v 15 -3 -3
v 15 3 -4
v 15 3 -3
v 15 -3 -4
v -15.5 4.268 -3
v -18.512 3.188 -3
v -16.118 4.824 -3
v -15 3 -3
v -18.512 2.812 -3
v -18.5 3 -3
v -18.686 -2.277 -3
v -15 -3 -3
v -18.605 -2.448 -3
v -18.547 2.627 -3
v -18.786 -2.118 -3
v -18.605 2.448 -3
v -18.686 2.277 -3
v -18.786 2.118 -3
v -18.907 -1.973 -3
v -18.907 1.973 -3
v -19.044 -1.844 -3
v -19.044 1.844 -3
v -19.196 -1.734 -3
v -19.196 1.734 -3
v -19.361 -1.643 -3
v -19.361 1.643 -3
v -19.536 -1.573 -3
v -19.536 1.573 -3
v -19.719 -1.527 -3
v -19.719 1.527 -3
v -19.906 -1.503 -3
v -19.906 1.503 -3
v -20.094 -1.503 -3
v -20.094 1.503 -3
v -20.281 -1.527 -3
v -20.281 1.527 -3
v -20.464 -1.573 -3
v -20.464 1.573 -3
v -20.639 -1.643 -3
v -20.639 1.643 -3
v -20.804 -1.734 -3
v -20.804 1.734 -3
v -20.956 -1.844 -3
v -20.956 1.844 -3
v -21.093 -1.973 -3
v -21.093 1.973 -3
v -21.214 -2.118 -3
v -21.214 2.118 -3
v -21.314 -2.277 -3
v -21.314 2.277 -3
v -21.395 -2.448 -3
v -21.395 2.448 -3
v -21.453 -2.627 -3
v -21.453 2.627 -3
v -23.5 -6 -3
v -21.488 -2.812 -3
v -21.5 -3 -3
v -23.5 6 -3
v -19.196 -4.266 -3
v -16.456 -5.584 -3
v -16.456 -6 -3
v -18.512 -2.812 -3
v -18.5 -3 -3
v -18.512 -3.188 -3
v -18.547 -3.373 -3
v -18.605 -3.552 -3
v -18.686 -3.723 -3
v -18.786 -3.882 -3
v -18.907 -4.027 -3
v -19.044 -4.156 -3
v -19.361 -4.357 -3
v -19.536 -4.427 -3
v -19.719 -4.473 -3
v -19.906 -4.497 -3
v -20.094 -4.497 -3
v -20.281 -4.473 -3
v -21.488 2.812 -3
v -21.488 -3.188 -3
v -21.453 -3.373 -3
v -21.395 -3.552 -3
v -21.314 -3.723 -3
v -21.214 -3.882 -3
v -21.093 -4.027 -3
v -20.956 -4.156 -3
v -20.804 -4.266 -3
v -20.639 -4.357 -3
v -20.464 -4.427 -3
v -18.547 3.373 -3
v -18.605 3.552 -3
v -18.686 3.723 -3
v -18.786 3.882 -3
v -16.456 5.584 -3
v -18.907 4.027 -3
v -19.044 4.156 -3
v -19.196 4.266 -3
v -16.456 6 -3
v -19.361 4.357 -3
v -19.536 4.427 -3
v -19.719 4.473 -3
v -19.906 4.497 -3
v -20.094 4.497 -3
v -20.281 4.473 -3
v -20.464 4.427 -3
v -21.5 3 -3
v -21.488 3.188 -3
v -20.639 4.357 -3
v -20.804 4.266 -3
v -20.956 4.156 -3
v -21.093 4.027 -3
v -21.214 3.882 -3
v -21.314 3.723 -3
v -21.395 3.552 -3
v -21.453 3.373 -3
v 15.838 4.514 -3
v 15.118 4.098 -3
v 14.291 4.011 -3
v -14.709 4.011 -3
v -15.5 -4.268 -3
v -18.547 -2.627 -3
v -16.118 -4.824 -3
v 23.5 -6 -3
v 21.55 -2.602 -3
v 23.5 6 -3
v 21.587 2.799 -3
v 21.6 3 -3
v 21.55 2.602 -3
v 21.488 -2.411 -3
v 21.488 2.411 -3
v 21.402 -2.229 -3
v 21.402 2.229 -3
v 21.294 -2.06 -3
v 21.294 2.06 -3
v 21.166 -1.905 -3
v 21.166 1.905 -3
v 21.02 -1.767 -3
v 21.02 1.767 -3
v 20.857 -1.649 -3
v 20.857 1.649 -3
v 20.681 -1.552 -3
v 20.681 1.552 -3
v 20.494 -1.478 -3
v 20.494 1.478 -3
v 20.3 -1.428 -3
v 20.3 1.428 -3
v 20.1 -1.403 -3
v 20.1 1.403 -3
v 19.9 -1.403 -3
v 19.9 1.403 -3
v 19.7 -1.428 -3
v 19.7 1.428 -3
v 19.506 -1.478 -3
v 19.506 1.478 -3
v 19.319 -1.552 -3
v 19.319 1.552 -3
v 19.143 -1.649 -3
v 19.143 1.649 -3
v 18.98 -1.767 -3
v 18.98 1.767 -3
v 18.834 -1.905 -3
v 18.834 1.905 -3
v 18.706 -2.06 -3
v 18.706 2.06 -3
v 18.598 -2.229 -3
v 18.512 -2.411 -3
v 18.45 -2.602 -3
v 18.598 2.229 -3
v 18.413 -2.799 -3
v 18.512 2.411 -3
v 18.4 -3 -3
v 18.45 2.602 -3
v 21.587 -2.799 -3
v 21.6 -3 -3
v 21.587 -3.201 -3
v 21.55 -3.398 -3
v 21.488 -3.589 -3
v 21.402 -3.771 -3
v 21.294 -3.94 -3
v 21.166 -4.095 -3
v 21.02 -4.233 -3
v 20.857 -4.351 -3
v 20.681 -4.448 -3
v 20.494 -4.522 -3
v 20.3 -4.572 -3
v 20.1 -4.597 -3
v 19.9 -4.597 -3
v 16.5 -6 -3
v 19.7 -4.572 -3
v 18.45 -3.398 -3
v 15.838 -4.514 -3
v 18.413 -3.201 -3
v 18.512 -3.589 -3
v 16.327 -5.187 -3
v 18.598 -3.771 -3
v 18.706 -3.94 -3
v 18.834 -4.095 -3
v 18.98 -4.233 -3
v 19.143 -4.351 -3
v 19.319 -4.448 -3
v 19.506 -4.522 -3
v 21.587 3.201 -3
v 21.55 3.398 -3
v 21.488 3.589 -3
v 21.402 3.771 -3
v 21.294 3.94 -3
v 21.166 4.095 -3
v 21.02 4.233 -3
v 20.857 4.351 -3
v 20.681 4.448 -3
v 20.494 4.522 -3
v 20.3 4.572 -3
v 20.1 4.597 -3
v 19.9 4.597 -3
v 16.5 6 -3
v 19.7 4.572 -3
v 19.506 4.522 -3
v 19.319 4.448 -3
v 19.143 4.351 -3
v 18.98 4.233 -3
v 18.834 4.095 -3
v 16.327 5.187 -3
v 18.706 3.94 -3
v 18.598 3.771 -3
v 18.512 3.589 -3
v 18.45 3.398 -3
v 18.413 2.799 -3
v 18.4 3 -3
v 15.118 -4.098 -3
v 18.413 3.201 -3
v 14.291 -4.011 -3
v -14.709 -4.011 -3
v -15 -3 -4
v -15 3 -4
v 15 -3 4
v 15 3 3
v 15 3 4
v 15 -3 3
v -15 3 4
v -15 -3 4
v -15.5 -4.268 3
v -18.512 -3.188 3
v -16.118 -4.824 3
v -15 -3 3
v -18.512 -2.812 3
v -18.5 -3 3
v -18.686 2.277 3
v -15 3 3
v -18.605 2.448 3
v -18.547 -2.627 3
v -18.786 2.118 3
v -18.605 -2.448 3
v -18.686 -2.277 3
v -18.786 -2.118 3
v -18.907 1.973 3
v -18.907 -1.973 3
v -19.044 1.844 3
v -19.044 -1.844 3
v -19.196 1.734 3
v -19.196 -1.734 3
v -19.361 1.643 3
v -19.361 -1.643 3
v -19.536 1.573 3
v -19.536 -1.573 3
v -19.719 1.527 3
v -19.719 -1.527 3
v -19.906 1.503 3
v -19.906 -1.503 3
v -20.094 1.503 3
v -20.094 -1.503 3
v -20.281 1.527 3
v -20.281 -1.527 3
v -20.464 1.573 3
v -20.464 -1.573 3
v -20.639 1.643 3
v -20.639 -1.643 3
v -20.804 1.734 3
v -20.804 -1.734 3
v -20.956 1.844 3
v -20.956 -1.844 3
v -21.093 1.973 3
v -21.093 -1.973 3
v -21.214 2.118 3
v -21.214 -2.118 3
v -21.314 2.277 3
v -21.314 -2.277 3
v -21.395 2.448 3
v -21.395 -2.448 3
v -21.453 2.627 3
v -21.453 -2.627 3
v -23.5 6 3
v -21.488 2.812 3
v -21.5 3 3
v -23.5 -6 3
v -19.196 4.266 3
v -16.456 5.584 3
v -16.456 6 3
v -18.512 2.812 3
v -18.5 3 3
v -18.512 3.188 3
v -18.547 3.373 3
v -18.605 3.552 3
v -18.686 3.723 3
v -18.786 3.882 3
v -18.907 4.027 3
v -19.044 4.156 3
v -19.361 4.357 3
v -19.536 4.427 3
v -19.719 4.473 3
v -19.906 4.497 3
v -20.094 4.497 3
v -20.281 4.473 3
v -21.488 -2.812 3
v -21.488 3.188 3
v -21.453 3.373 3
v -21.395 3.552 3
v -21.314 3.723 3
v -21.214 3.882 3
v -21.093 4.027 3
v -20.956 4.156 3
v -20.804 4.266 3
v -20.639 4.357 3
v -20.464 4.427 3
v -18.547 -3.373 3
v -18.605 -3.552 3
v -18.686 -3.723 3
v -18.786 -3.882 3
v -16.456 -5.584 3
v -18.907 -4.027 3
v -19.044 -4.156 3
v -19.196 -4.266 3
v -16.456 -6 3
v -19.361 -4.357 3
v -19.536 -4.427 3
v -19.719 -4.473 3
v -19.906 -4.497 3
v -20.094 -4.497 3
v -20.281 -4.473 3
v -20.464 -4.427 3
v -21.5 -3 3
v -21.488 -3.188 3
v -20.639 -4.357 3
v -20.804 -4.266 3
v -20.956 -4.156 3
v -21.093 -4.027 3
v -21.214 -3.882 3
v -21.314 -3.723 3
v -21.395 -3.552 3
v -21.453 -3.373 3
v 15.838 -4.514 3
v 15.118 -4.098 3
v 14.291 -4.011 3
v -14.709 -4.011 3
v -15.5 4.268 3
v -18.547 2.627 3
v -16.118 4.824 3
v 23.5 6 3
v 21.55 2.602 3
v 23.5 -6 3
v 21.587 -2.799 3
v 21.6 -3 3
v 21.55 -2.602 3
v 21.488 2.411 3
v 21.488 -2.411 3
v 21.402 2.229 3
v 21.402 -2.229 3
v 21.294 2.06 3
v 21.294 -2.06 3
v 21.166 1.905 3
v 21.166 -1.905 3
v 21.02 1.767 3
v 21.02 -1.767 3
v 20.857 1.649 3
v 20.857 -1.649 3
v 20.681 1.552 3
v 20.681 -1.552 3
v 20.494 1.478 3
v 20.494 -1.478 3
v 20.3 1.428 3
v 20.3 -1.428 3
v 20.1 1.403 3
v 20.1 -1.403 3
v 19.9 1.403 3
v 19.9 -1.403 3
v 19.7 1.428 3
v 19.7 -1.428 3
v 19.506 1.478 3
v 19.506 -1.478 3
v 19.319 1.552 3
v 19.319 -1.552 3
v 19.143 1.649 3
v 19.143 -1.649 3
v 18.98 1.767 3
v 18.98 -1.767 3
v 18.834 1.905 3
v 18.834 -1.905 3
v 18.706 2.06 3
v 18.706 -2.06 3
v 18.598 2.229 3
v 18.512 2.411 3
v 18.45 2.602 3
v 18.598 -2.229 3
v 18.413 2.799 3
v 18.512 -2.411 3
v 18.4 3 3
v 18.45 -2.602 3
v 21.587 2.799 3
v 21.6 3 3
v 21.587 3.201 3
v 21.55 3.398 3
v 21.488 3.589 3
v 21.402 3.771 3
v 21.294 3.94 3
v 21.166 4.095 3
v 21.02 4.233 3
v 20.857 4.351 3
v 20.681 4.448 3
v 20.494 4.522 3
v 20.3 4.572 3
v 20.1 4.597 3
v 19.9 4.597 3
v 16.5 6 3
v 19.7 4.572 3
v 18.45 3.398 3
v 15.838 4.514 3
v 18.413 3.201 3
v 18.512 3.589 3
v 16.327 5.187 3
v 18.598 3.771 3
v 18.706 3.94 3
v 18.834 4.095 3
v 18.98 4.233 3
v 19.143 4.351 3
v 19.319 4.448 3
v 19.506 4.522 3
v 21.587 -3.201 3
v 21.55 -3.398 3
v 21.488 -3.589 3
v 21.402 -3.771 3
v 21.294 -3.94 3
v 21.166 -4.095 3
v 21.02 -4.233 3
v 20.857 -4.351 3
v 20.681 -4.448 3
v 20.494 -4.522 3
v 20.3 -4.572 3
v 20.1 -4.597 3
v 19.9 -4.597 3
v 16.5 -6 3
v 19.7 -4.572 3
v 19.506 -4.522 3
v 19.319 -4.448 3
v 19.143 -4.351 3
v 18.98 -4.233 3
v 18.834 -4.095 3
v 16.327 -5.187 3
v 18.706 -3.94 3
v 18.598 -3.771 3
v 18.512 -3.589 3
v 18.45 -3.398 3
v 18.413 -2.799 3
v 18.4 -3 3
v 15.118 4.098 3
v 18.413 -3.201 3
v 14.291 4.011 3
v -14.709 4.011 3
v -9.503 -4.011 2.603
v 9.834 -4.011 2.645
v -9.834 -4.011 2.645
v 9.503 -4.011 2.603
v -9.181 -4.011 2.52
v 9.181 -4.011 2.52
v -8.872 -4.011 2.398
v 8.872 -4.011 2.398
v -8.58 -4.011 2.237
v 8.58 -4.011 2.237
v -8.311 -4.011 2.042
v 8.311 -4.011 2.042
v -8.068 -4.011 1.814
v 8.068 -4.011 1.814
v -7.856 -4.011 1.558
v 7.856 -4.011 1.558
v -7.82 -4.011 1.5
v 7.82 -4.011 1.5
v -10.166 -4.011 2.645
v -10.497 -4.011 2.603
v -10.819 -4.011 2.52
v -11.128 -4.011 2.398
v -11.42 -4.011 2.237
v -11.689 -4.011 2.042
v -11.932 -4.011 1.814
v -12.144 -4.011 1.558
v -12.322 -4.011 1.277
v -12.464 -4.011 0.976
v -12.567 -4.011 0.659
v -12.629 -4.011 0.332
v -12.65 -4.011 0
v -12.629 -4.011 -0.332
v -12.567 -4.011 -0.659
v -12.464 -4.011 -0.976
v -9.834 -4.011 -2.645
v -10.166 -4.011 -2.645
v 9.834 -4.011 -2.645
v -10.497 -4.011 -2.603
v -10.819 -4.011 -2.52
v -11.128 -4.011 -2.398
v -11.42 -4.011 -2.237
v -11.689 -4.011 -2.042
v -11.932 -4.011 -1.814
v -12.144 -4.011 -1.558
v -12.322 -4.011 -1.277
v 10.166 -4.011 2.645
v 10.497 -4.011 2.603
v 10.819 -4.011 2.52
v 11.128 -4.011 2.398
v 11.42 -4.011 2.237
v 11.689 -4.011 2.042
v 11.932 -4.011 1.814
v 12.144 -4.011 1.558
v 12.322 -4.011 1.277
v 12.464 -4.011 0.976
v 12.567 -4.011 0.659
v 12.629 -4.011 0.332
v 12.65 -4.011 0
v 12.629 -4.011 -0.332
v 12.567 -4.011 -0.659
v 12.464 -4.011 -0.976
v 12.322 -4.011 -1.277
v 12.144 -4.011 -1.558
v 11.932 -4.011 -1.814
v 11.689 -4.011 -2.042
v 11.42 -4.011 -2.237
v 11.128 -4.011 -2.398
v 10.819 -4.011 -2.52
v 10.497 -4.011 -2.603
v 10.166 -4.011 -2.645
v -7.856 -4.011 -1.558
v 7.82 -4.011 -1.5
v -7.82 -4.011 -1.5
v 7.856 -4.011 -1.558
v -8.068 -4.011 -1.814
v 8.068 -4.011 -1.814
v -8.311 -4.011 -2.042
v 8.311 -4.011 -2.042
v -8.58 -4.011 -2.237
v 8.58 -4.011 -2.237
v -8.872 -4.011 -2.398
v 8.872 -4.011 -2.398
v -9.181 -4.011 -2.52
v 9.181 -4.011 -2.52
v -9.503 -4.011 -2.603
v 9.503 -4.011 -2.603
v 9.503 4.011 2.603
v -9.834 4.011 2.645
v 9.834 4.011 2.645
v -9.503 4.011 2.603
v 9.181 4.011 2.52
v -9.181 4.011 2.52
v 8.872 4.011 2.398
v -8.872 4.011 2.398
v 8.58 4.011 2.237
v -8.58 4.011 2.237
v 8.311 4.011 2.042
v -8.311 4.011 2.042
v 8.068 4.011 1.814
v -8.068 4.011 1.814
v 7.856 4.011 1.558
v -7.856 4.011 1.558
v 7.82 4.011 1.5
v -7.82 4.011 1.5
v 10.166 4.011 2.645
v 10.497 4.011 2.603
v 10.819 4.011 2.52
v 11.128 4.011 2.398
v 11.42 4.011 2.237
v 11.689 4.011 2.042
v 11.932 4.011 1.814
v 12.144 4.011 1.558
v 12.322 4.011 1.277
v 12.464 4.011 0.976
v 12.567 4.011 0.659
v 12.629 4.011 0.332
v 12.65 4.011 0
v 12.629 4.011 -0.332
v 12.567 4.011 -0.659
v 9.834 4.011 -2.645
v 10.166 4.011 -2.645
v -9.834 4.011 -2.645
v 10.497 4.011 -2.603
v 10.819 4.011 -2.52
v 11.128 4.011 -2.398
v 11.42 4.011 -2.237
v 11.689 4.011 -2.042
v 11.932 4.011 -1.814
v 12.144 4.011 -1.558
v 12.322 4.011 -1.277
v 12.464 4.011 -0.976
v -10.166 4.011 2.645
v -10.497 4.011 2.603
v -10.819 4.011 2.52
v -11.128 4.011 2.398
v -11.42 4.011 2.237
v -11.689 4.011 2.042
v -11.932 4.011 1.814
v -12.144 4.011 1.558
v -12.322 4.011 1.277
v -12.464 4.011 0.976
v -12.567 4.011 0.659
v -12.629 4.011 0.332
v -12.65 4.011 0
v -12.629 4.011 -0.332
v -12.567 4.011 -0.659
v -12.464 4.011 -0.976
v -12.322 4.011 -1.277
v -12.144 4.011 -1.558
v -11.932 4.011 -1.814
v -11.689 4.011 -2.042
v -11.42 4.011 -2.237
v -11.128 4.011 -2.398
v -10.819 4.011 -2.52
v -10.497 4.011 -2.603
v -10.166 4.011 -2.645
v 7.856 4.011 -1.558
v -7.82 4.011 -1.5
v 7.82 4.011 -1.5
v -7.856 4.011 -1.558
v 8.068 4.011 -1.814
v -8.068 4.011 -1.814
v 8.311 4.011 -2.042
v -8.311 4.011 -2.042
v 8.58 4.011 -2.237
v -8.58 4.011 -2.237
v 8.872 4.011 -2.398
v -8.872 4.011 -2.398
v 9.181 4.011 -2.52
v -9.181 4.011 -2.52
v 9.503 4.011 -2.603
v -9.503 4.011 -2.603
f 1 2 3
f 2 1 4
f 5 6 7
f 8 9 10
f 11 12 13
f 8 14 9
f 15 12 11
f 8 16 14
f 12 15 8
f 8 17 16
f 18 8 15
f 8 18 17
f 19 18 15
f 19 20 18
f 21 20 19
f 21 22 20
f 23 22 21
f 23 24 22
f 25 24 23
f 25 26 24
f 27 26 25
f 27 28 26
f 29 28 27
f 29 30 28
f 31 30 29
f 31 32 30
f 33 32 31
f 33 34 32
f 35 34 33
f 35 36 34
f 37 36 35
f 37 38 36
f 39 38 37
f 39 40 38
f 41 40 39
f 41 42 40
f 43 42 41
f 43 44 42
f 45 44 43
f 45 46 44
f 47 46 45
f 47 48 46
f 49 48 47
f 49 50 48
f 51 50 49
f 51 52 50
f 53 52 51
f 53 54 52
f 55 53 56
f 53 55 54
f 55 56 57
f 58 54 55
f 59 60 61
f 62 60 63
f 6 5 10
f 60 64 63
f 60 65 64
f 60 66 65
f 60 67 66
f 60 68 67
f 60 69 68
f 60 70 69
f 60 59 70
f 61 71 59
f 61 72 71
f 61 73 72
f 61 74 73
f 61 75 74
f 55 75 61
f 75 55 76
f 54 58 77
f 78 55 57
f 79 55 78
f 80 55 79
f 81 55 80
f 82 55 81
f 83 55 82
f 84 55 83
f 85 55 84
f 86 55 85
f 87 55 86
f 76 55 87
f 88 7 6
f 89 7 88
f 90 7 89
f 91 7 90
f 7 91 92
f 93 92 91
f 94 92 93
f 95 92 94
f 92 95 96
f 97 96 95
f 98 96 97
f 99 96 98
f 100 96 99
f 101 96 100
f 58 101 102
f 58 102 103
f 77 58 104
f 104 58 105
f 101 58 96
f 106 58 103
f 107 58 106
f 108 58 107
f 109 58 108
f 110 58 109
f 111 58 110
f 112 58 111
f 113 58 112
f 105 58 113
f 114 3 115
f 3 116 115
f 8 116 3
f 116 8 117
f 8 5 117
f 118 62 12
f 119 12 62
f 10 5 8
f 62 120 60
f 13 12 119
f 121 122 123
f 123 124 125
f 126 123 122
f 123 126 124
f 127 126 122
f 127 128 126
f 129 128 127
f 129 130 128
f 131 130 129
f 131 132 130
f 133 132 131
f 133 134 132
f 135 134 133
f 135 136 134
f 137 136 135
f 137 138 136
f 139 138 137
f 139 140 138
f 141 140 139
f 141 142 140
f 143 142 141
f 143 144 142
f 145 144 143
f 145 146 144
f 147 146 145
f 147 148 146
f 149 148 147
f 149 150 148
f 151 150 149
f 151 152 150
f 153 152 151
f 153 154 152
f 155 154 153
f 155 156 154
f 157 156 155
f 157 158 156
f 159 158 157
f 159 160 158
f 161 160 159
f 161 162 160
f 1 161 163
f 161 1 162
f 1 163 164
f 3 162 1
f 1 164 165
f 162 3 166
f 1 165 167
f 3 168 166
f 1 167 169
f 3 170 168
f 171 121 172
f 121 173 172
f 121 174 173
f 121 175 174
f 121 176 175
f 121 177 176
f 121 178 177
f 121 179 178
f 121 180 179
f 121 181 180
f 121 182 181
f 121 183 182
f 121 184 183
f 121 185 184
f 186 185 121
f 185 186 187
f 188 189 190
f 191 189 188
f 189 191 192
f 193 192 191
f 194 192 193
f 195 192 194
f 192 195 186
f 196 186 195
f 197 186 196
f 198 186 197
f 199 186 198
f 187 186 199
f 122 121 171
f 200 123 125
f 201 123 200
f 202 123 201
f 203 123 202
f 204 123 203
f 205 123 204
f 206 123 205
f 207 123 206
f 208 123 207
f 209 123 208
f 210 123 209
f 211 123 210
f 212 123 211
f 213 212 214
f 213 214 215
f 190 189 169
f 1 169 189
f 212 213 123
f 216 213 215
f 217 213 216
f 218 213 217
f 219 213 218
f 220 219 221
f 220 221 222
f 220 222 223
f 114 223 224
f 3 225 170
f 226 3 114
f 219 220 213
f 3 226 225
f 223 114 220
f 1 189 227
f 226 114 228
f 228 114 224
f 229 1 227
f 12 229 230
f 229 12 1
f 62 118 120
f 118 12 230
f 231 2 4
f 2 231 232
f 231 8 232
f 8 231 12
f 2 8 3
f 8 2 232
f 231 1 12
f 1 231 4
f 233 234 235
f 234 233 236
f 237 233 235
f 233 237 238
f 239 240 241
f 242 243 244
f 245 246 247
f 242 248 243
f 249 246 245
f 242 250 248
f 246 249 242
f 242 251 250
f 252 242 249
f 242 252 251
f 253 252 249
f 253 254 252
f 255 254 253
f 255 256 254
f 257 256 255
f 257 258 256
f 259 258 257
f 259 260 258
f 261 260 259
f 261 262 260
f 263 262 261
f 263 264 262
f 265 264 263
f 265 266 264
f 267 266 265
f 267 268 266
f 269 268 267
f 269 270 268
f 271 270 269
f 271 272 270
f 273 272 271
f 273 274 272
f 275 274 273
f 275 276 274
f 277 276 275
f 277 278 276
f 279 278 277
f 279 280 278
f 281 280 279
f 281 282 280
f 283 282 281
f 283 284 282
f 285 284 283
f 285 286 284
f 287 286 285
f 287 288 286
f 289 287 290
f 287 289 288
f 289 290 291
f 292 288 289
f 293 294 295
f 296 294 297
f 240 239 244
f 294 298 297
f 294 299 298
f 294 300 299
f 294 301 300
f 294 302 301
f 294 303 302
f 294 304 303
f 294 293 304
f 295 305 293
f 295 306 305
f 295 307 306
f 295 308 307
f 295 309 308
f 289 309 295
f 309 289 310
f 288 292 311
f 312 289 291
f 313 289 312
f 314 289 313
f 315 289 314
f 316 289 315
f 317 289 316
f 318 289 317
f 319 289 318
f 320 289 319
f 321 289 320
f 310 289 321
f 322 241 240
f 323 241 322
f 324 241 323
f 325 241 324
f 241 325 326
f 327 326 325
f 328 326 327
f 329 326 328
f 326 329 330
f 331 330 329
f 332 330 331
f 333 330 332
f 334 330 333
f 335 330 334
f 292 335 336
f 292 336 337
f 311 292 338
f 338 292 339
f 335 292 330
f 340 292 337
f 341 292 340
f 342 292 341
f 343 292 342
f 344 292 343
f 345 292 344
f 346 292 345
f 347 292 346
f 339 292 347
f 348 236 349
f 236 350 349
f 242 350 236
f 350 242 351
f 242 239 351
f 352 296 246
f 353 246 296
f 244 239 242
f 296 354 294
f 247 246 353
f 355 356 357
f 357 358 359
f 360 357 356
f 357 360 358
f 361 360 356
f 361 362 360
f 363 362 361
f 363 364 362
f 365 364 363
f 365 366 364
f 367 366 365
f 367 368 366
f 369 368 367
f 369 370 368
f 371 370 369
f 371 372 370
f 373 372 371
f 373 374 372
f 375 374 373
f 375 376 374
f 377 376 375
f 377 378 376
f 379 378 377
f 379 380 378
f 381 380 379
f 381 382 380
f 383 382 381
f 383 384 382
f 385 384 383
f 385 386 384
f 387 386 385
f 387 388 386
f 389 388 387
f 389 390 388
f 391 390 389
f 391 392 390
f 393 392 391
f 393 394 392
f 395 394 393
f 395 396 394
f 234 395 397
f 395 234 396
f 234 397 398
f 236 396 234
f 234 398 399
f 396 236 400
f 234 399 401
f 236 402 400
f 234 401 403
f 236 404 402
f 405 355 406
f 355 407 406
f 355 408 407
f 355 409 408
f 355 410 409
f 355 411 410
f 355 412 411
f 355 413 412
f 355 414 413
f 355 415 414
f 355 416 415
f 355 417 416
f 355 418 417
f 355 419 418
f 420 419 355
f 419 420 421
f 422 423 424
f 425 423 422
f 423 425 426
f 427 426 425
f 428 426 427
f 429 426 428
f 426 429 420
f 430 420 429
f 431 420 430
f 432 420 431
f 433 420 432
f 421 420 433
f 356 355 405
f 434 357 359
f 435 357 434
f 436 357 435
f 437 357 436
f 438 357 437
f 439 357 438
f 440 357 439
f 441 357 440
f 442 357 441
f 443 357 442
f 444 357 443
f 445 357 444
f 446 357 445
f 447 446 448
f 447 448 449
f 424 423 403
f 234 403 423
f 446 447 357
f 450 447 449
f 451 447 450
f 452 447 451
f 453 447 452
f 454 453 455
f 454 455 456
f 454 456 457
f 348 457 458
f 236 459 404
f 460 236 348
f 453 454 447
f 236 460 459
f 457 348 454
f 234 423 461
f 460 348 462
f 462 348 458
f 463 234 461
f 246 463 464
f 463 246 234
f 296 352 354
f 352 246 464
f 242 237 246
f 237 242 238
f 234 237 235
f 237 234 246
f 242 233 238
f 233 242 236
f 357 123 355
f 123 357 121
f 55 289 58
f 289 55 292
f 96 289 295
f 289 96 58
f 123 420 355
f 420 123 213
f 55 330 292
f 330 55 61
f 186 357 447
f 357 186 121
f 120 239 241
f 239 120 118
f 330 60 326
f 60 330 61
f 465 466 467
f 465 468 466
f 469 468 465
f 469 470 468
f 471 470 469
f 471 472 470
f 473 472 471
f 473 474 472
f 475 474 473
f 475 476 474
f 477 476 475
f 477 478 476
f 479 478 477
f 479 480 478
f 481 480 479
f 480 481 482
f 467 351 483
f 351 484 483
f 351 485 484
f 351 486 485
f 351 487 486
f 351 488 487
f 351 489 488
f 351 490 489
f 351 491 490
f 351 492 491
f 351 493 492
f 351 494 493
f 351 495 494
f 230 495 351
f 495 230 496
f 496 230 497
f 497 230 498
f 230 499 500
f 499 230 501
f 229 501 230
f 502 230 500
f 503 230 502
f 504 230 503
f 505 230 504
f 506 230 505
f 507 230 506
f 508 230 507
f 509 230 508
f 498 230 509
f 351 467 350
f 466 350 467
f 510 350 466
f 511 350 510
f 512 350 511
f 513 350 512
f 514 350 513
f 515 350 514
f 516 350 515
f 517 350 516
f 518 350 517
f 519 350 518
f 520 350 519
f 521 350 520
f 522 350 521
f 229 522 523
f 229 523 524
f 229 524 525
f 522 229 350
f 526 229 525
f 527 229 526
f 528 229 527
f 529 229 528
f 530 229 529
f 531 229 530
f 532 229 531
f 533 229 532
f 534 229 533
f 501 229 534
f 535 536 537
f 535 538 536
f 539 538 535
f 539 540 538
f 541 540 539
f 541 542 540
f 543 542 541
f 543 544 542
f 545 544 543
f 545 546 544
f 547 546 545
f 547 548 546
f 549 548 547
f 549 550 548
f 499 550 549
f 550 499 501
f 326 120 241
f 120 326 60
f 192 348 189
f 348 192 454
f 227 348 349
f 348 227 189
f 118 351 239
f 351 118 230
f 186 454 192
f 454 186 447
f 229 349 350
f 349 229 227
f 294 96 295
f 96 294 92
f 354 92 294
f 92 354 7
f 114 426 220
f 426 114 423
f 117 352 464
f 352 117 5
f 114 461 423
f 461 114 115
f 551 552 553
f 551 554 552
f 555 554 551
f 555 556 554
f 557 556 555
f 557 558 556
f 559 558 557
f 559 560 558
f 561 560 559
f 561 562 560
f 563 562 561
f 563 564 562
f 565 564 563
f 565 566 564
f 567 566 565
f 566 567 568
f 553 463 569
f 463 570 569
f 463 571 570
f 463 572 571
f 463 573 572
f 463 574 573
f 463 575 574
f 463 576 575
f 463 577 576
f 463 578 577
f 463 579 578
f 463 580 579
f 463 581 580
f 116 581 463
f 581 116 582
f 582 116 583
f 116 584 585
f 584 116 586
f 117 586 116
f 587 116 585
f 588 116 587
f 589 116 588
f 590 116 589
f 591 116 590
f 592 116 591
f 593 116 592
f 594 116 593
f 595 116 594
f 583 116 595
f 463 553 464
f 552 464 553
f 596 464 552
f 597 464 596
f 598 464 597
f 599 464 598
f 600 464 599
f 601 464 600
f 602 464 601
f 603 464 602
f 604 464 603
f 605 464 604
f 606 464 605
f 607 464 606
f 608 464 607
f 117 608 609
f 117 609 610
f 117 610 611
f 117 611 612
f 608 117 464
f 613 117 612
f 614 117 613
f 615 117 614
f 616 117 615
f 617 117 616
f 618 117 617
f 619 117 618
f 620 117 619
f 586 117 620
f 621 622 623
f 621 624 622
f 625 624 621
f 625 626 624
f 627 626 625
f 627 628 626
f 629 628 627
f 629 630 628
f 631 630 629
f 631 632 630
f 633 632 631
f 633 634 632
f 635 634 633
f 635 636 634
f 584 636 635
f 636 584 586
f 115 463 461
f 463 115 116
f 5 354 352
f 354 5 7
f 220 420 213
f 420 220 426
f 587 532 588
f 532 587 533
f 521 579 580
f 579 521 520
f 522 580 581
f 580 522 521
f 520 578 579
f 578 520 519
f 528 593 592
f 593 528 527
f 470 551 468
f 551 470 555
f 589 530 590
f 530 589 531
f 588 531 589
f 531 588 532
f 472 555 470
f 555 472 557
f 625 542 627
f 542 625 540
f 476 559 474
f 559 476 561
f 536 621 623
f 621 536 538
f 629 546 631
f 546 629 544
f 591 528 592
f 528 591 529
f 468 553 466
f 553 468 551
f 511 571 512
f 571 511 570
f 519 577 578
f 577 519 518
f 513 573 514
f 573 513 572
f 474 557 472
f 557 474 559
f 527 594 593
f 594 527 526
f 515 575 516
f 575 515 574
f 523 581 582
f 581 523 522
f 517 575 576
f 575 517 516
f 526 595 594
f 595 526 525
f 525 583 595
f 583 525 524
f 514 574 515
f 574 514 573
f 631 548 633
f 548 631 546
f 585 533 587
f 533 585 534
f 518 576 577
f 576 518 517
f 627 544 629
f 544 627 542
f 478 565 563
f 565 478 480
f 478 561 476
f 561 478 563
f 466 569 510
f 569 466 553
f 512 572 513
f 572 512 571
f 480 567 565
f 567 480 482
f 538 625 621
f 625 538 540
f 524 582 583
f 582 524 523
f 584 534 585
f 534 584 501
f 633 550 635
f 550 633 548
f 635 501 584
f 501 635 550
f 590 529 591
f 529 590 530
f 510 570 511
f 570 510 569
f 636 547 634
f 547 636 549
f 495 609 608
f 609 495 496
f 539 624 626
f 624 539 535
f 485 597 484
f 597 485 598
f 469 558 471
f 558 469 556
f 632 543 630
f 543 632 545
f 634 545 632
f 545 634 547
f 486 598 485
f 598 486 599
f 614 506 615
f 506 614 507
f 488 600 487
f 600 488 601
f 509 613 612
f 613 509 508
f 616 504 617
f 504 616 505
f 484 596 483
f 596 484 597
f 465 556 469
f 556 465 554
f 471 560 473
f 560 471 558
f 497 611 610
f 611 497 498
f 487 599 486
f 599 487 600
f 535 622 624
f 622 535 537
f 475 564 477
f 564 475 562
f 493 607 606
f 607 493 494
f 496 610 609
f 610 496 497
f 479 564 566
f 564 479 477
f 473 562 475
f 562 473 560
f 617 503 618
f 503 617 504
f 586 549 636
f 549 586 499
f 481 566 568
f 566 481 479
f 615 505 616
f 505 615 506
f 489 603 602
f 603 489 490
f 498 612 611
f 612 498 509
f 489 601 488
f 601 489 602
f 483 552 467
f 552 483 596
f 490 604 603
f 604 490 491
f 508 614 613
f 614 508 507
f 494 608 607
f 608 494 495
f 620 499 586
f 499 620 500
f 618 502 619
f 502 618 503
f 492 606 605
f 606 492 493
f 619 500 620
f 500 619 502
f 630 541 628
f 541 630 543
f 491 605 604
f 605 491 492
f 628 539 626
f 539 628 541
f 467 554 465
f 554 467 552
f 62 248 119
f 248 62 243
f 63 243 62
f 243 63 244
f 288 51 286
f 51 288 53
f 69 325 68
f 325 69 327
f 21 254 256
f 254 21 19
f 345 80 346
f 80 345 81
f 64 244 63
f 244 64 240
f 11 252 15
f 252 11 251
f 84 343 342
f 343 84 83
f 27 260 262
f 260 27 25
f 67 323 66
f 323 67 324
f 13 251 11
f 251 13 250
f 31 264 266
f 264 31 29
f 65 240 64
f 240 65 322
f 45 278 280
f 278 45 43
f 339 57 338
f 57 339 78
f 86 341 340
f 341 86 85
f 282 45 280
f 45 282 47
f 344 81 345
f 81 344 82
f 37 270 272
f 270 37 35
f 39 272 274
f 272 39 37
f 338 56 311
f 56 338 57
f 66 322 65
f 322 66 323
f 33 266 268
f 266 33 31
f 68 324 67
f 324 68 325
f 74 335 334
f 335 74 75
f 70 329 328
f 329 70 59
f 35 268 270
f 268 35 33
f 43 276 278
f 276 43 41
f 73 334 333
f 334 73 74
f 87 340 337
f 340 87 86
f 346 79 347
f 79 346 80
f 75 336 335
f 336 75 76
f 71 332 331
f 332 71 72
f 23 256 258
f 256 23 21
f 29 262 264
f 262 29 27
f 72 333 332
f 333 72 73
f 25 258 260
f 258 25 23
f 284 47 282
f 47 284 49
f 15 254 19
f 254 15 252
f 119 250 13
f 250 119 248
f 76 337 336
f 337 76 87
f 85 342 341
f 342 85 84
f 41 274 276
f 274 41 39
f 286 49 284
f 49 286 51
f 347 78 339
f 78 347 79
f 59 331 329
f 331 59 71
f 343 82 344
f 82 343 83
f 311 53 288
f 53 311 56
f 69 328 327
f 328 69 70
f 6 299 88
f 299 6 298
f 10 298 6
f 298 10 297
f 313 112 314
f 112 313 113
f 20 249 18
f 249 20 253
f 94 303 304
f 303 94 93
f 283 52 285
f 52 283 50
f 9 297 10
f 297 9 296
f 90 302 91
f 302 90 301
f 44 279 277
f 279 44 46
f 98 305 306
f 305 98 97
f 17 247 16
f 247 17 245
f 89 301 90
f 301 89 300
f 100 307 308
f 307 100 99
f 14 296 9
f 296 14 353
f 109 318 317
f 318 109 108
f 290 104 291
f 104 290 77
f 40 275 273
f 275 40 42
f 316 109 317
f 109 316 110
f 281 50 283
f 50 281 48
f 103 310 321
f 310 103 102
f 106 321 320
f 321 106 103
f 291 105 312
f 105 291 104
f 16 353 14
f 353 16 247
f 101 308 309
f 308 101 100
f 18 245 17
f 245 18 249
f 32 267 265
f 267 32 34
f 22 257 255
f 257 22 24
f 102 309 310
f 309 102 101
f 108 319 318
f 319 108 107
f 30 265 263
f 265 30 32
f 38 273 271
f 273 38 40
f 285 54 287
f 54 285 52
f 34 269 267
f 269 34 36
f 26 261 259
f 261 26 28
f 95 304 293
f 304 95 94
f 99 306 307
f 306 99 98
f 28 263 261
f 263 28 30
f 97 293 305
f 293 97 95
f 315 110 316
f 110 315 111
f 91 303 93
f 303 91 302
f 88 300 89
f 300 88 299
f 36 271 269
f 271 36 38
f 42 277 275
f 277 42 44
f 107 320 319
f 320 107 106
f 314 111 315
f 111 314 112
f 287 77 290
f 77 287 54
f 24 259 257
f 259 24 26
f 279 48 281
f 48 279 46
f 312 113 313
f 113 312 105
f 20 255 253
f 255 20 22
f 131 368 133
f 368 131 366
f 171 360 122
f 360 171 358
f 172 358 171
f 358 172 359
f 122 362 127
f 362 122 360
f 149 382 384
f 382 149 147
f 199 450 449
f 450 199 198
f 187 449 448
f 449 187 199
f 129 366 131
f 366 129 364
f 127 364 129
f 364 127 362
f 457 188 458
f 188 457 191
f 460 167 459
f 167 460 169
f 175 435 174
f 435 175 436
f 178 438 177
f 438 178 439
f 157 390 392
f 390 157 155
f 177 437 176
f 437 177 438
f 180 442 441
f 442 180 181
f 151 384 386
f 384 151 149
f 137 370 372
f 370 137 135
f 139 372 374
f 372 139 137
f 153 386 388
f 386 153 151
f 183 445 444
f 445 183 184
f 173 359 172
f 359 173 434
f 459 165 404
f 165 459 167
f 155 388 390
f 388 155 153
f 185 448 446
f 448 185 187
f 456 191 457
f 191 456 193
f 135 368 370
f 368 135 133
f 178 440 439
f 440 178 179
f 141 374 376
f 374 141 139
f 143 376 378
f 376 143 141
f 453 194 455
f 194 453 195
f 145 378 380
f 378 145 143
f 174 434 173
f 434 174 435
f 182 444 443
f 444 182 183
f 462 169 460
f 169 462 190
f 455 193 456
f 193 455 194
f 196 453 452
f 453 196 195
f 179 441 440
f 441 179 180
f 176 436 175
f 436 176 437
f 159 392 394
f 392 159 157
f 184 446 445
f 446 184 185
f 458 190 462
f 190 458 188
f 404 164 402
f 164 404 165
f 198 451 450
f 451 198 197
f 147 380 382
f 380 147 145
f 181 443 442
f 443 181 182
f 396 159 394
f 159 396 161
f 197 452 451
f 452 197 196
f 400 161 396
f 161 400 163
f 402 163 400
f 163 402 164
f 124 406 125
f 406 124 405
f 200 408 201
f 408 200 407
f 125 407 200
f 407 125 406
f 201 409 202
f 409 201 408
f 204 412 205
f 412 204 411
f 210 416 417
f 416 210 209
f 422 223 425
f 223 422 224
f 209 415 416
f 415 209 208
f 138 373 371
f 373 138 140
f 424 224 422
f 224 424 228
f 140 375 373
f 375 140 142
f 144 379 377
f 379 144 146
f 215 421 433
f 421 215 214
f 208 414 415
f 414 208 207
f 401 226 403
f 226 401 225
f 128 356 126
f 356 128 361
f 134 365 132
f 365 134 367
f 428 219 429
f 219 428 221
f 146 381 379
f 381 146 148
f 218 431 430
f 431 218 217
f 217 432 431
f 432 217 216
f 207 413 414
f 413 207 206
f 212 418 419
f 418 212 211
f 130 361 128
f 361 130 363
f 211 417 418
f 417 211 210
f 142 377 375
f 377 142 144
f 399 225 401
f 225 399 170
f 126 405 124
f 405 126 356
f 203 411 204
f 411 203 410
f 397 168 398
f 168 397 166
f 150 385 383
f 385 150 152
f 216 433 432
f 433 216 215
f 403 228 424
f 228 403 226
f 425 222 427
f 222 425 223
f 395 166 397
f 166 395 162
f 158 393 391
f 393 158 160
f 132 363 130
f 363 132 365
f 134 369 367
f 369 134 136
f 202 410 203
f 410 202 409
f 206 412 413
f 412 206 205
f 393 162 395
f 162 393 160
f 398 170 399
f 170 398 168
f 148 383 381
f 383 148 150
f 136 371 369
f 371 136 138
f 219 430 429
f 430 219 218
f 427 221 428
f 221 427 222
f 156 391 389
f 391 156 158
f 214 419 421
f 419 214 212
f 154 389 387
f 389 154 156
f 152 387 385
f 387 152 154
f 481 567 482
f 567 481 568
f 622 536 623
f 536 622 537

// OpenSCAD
// file: ../load_cell.scad
// load_cell.scad: draws a bar load cell from a row in load_cells.scad.
//
// The bar is centred on the origin with its length along x and its mounting
// holes along z. A strain gauge sits on its top and bottom faces over the
// bending section: two bores across the bar (y), joined by a slot when the
// row gives the slot's height.
//
// A row is [name, size, gauge, bores, holes, notches]:
//   size     [length, width, height] of the bar
//   gauge    [length, width, thickness] of each strain gauge
//   bores    [diameter, [x1, y1], [x2, y2]], or with a 4th value, the height
//            of the slot between them
//   holes    groups of mounting holes, each [diameter, [xA, yA], [xB, yB]]
//   notches  [length, depth] of the notches along both sides, or undef

function lc_name(type) = type[0];          // e.g. "TAL220"
function lc_cell_dims(type) = type[1];     // [length, width, height]
function lc_sensor_dims(type) = type[2];   // [length, width, thickness]
function lc_center_cutout(type) = type[3]; // [diameter, [x1, y1], [x2, y2] (, slot height)]
function lc_screw_holes(type) = type[4];   // [[diameter, [xA, yA], [xB, yB]], ...]
function lc_side_cuts(type) = type[5];     // [length, depth], or undef

module load_cell(type, load_cell_color = "silver", sensor_color = "white") {
  size = lc_cell_dims(type);
  gauge = lc_sensor_dims(type);
  bores = lc_center_cutout(type);
  holes = lc_screw_holes(type);
  notches = lc_side_cuts(type);

  difference() {
    union() {
      color(load_cell_color) cube(size, center = true);
      color(sensor_color) for (s = [-1, 1]) translate([0, 0, s * (size.z + gauge.z) / 2]) cube(gauge, center = true);
    }
    // Notches along both sides, rounded at their ends
    if (is_list(notches))
      for (y = [-size.y / 2, size.y / 2]) hull()
        for (x = [-1, 1]) translate([x * (notches[0] / 2 - 2), y, 0])
          cylinder(r = notches[1], h = size.z + 1, center = true, $fn = 15);
    // The bending section
    for (p = [bores[1], bores[2]])
      translate([p.x, 0, 0]) rotate([90, 0, 0]) cylinder(d = bores[0], h = size.y + 1, center = true, $fn = 50);
    if (len(bores) > 3)
      translate([(bores[1].x + bores[2].x) / 2, 0, 0]) cube([abs(bores[1].x - bores[2].x), size.y + 1, bores[3]], center = true);
    // Mounting holes, through the bar
    for (g = holes, p = [g[1], g[2]])
      translate([p.x, p.y, 0]) cylinder(d = g[0], h = size.z + 2, center = true, $fn = 50);
  }
}
// file: ../load_cells.scad
// load_cells.scad: bar load cells, one row each, for load_cell().
//
// include this file to get the LC_* rows and the load_cells list; it uses
// load_cell.scad for the accessors and the drawing. The row format is at the
// top of load_cell.scad. Sizes in mm; the bar is centred on the origin.

//                   name              size                  gauge          bores                              mounting holes                                                notches
// komputer.de 10 kg: the TAL220's bar with its own hole positions; M4 both ends.
LC_komputer_10kg = ["komputer_10kg", [75.2, 12.7, 12.7], [24, 12, 1], [12.0, [4, 0], [-4, 0]], [[4, [-31.6, 0], [-21.6, 0]], [4, [21.6, 0], [31.6, 0]]], undef];

// komputer.de 5 kg: M5 at one end, M4 at the other.
LC_komputer_5kg = ["komputer_5kg", [80.2, 12.7, 12.7], [24, 12, 1], [12.0, [4, 0], [-4, 0]], [[5, [-35, 0], [-20, 0]], [4, [20, 0], [35, 0]]], undef];

// TAL220 (10 kg straight bar): M5 at one end, M4 at the other.
LC_TAL220 = ["TAL220", [80, 12.7, 12.7], [24, 12, 1], [12.0, [4, 0], [-4, 0]], [[5, [-35, 0], [-25, 0]], [4, [25, 0], [35, 0]]], undef];

// TAL220B (5 kg straight bar): one M5 hole at each end.
LC_TAL220B = ["TAL220B", [55, 12.7, 12.7], [24, 12, 1], [12.0, [4, 0], [-4, 0]], [[5, [-20, 0], [20, 0]]], undef];

// TAL221 (100 g mini bar): bores joined by a 3 mm slot, notched sides, two
// M3 holes at each end.
LC_TAL221 = ["TAL221", [47, 12, 6], [30, 6, 1], [5.3, [10, 0], [-10, 0], 3], [[3.0, [-20, -3], [-20, 3]], [3.2, [20, -3], [20, 3]]], [33, 2]];

load_cells = [LC_komputer_10kg, LC_komputer_5kg, LC_TAL220, LC_TAL220B, LC_TAL221];

use <load_cell.scad>
// main file
// The TAL221 from the side: its bores, the slot joining them, and the gauges.
include <../load_cells.scad>;

load_cell(LC_TAL221);
